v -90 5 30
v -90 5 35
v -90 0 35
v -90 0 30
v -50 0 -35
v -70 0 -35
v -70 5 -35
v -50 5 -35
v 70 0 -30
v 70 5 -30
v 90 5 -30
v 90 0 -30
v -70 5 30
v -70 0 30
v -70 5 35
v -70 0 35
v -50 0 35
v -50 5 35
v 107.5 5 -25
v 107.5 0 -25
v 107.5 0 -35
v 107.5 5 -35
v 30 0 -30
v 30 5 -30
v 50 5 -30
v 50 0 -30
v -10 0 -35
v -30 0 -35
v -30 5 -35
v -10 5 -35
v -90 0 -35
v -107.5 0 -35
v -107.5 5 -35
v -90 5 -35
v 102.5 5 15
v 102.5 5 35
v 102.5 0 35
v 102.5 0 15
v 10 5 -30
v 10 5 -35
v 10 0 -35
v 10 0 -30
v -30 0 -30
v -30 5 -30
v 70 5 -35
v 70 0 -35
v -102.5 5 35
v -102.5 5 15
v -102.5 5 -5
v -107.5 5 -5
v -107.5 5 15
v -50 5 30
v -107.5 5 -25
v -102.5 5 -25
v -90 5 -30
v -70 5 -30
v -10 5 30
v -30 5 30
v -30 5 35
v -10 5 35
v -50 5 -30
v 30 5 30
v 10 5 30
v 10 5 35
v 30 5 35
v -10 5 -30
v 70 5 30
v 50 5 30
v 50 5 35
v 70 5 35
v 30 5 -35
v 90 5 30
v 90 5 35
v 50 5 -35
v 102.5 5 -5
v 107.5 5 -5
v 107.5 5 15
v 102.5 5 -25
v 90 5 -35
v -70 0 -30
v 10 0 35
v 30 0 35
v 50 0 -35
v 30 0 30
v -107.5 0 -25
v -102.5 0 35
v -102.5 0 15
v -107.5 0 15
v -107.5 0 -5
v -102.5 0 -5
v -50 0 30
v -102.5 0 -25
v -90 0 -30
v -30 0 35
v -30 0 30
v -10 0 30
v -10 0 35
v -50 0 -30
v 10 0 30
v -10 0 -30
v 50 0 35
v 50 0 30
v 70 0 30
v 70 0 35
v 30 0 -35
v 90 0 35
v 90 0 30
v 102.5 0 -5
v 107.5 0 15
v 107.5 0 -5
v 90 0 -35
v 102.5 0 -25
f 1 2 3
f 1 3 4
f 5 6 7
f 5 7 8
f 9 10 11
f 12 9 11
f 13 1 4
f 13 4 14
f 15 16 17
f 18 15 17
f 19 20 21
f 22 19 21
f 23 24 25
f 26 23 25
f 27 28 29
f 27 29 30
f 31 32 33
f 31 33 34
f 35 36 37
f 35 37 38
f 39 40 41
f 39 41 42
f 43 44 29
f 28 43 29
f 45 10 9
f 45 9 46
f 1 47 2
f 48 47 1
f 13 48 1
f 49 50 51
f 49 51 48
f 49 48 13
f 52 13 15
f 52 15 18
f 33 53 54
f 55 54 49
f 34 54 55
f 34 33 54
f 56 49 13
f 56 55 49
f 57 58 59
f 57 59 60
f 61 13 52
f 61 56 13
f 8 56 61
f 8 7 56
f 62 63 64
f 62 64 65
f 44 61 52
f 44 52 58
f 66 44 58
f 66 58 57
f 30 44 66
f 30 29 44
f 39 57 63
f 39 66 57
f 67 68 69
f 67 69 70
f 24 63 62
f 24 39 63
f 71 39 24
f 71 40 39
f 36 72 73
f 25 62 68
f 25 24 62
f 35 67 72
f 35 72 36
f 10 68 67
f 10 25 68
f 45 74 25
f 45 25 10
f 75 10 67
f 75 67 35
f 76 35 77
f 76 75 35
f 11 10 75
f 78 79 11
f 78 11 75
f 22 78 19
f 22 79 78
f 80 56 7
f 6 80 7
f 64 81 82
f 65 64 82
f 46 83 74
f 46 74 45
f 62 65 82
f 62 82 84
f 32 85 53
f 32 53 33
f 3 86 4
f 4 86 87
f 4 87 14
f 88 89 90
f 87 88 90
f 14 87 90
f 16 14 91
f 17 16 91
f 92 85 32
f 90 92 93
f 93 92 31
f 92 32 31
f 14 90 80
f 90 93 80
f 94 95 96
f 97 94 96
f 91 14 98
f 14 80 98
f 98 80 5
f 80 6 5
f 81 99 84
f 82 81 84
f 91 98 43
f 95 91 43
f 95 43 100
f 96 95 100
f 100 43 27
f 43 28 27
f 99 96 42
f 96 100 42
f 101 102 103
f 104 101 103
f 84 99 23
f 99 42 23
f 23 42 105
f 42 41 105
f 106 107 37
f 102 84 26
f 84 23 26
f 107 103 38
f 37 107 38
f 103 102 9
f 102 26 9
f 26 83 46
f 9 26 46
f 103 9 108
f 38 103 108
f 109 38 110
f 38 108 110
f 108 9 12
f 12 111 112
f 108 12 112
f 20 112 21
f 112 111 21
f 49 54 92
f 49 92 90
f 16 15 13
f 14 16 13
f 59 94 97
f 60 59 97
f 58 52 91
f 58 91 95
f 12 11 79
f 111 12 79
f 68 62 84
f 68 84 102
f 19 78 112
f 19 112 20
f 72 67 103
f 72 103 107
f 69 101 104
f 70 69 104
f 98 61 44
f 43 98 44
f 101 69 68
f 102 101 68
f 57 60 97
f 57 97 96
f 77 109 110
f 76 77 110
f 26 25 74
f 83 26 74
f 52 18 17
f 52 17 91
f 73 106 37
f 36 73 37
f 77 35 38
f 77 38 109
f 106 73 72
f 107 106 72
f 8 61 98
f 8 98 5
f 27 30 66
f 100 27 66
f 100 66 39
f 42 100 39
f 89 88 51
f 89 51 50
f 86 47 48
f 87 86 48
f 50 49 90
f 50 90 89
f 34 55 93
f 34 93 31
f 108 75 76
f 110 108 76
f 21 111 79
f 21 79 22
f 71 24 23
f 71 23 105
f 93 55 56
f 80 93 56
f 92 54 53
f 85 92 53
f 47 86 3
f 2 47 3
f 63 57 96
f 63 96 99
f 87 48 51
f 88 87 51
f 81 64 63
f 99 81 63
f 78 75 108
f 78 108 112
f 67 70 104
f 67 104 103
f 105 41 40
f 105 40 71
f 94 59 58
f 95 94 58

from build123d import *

# Parameters (mm, degrees)
SKETCH_1_W               = 215
SKETCH_1_H               = 70
EXTRUDE_1_DEPTH          = 5
CUT_EXTRUDE_1_REACH      = 115.165
SKETCH_2_W               = 20
SKETCH_2_H               = 5
PATTERN_LINEAR_1_COUNT   = 3
PATTERN_LINEAR_1_PITCH   = 40
PATTERN_LINEAR_2_COUNT   = 3
PATTERN_LINEAR_2_PITCH   = 40
CUT_EXTRUDE_2_REACH      = 115.165
SKETCH_3_W               = 5
SKETCH_3_H               = 20
PATTERN_LINEAR_3_COUNT   = 2
PATTERN_LINEAR_3_PITCH   = 40
MIRROR_1_COPY_1_REACH    = 115.165
MIRROR_1_COPY_1_SKETCH_W = 5
MIRROR_1_COPY_1_SKETCH_H = 20
MIRROR_3_COPY_1_REACH    = 115.165
MIRROR_3_COPY_1_SKETCH_W = 20
MIRROR_3_COPY_1_SKETCH_H = 5
MIRROR_3_COPY_2_REACH    = 115.165
MIRROR_3_COPY_2_SKETCH_W = 20
MIRROR_3_COPY_2_SKETCH_H = 5
MIRROR_3_COPY_3_REACH    = 115.165
MIRROR_3_COPY_3_SKETCH_W = 20
MIRROR_3_COPY_3_SKETCH_H = 5
MIRROR_3_COPY_4_REACH    = 115.165
MIRROR_3_COPY_4_SKETCH_W = 20
MIRROR_3_COPY_4_SKETCH_H = 5


with BuildPart() as part:
    # 스케치1 → 보스-돌출1 (new body)
    with BuildSketch(Plane(origin=(0, 0, 0), x_dir=(1, 0, 0), z_dir=(0, 1, 0))):
        Rectangle(SKETCH_1_W, SKETCH_1_H)
    extrude(amount=EXTRUDE_1_DEPTH)

    # 스케치2 → 컷-돌출1 (cut, up to next)
    with BuildSketch(Plane(origin=(0, 5, 0), x_dir=(1, 0, 0), z_dir=(0, 1, 0)), mode=Mode.PRIVATE) as cut_extrude_1_sk1:
        with Locations((0, -32.5)):
            Rectangle(SKETCH_2_W, SKETCH_2_H)
    cut_extrude_1_tool1 = extrude(cut_extrude_1_sk1.sketch, amount=-CUT_EXTRUDE_1_REACH, mode=Mode.PRIVATE) & part.part
    cut_extrude_1 = cut_extrude_1_tool1.solids().sort_by_distance((0, 5, 32.5))[0]
    add(cut_extrude_1, mode=Mode.SUBTRACT)

    # 선형 패턴1: 컷-돌출1 ×3
    with Locations(*[(i * PATTERN_LINEAR_1_PITCH, 0, 0) for i in range(1, PATTERN_LINEAR_1_COUNT)]):
        add(cut_extrude_1, mode=Mode.SUBTRACT)

    # 선형 패턴2: 컷-돌출1 ×3
    with Locations(*[(-i * PATTERN_LINEAR_2_PITCH, 0, 0) for i in range(1, PATTERN_LINEAR_2_COUNT)]):
        add(cut_extrude_1, mode=Mode.SUBTRACT)

    # 스케치3 → 컷-돌출2 (cut, up to next)
    with BuildSketch(Plane(origin=(0, 5, 0), x_dir=(1, 0, 0), z_dir=(0, 1, 0)), mode=Mode.PRIVATE) as cut_extrude_2_sk1:
        with Locations((105, -25)):
            Rectangle(SKETCH_3_W, SKETCH_3_H)
    cut_extrude_2_tool1 = extrude(cut_extrude_2_sk1.sketch, amount=-CUT_EXTRUDE_2_REACH, mode=Mode.PRIVATE) & part.part
    cut_extrude_2 = cut_extrude_2_tool1.solids().sort_by_distance((105, 5, 25))[0]
    add(cut_extrude_2, mode=Mode.SUBTRACT)

    # 선형 패턴3: 컷-돌출2 ×2
    with Locations(*[(0, 0, -i * PATTERN_LINEAR_3_PITCH) for i in range(1, PATTERN_LINEAR_3_COUNT)]):
        add(cut_extrude_2, mode=Mode.SUBTRACT)

    # 대칭 복사1: 컷-돌출2 across plane
    add(cut_extrude_2.mirror(Plane(origin=(0, 0, 0), x_dir=(0, 0, 1), z_dir=(1, 0, 0))), mode=Mode.SUBTRACT)

    # 대칭 복사1 copy 1 sketch → 대칭 복사1 copy 1 (cut, up to next)
    with BuildSketch(Plane(origin=(0, 5, -40), x_dir=(-1, 0, 0), z_dir=(0, 1, 0)), mode=Mode.PRIVATE) as mirror_1_copy_1_sk1:
        with Locations((105, 25)):
            Rectangle(MIRROR_1_COPY_1_SKETCH_W, MIRROR_1_COPY_1_SKETCH_H)
    mirror_1_copy_1_tool1 = extrude(mirror_1_copy_1_sk1.sketch, amount=-MIRROR_1_COPY_1_REACH, mode=Mode.PRIVATE) & part.part
    add(mirror_1_copy_1_tool1.solids().sort_by_distance((-105, 5, -15))[0], mode=Mode.SUBTRACT)

    # 대칭 복사3: 컷-돌출1 across plane
    add(cut_extrude_1.mirror(Plane.XY), mode=Mode.SUBTRACT)

    # 대칭 복사3 copy 1 sketch → 대칭 복사3 copy 1 (cut, up to next)
    with BuildSketch(Plane(origin=(40, 5, 0), x_dir=(1, 0, 0), z_dir=(0, 1, 0)), mode=Mode.PRIVATE) as mirror_3_copy_1_sk1:
        with Locations((0, 32.5)):
            Rectangle(MIRROR_3_COPY_1_SKETCH_W, MIRROR_3_COPY_1_SKETCH_H)
    mirror_3_copy_1_tool1 = extrude(mirror_3_copy_1_sk1.sketch, amount=-MIRROR_3_COPY_1_REACH, mode=Mode.PRIVATE) & part.part
    add(mirror_3_copy_1_tool1.solids().sort_by_distance((40, 5, -32.5))[0], mode=Mode.SUBTRACT)

    # 대칭 복사3 copy 2 sketch → 대칭 복사3 copy 2 (cut, up to next)
    with BuildSketch(Plane(origin=(80, 5, 0), x_dir=(1, 0, 0), z_dir=(0, 1, 0)), mode=Mode.PRIVATE) as mirror_3_copy_2_sk1:
        with Locations((0, 32.5)):
            Rectangle(MIRROR_3_COPY_2_SKETCH_W, MIRROR_3_COPY_2_SKETCH_H)
    mirror_3_copy_2_tool1 = extrude(mirror_3_copy_2_sk1.sketch, amount=-MIRROR_3_COPY_2_REACH, mode=Mode.PRIVATE) & part.part
    add(mirror_3_copy_2_tool1.solids().sort_by_distance((80, 5, -32.5))[0], mode=Mode.SUBTRACT)

    # 대칭 복사3 copy 3 sketch → 대칭 복사3 copy 3 (cut, up to next)
    with BuildSketch(Plane(origin=(-40, 5, 0), x_dir=(1, 0, 0), z_dir=(0, 1, 0)), mode=Mode.PRIVATE) as mirror_3_copy_3_sk1:
        with Locations((0, 32.5)):
            Rectangle(MIRROR_3_COPY_3_SKETCH_W, MIRROR_3_COPY_3_SKETCH_H)
    mirror_3_copy_3_tool1 = extrude(mirror_3_copy_3_sk1.sketch, amount=-MIRROR_3_COPY_3_REACH, mode=Mode.PRIVATE) & part.part
    add(mirror_3_copy_3_tool1.solids().sort_by_distance((-40, 5, -32.5))[0], mode=Mode.SUBTRACT)

    # 대칭 복사3 copy 4 sketch → 대칭 복사3 copy 4 (cut, up to next)
    with BuildSketch(Plane(origin=(-80, 5, 0), x_dir=(1, 0, 0), z_dir=(0, 1, 0)), mode=Mode.PRIVATE) as mirror_3_copy_4_sk1:
        with Locations((0, 32.5)):
            Rectangle(MIRROR_3_COPY_4_SKETCH_W, MIRROR_3_COPY_4_SKETCH_H)
    mirror_3_copy_4_tool1 = extrude(mirror_3_copy_4_sk1.sketch, amount=-MIRROR_3_COPY_4_REACH, mode=Mode.PRIVATE) & part.part
    add(mirror_3_copy_4_tool1.solids().sort_by_distance((-80, 5, -32.5))[0], mode=Mode.SUBTRACT)


solid = part.part
